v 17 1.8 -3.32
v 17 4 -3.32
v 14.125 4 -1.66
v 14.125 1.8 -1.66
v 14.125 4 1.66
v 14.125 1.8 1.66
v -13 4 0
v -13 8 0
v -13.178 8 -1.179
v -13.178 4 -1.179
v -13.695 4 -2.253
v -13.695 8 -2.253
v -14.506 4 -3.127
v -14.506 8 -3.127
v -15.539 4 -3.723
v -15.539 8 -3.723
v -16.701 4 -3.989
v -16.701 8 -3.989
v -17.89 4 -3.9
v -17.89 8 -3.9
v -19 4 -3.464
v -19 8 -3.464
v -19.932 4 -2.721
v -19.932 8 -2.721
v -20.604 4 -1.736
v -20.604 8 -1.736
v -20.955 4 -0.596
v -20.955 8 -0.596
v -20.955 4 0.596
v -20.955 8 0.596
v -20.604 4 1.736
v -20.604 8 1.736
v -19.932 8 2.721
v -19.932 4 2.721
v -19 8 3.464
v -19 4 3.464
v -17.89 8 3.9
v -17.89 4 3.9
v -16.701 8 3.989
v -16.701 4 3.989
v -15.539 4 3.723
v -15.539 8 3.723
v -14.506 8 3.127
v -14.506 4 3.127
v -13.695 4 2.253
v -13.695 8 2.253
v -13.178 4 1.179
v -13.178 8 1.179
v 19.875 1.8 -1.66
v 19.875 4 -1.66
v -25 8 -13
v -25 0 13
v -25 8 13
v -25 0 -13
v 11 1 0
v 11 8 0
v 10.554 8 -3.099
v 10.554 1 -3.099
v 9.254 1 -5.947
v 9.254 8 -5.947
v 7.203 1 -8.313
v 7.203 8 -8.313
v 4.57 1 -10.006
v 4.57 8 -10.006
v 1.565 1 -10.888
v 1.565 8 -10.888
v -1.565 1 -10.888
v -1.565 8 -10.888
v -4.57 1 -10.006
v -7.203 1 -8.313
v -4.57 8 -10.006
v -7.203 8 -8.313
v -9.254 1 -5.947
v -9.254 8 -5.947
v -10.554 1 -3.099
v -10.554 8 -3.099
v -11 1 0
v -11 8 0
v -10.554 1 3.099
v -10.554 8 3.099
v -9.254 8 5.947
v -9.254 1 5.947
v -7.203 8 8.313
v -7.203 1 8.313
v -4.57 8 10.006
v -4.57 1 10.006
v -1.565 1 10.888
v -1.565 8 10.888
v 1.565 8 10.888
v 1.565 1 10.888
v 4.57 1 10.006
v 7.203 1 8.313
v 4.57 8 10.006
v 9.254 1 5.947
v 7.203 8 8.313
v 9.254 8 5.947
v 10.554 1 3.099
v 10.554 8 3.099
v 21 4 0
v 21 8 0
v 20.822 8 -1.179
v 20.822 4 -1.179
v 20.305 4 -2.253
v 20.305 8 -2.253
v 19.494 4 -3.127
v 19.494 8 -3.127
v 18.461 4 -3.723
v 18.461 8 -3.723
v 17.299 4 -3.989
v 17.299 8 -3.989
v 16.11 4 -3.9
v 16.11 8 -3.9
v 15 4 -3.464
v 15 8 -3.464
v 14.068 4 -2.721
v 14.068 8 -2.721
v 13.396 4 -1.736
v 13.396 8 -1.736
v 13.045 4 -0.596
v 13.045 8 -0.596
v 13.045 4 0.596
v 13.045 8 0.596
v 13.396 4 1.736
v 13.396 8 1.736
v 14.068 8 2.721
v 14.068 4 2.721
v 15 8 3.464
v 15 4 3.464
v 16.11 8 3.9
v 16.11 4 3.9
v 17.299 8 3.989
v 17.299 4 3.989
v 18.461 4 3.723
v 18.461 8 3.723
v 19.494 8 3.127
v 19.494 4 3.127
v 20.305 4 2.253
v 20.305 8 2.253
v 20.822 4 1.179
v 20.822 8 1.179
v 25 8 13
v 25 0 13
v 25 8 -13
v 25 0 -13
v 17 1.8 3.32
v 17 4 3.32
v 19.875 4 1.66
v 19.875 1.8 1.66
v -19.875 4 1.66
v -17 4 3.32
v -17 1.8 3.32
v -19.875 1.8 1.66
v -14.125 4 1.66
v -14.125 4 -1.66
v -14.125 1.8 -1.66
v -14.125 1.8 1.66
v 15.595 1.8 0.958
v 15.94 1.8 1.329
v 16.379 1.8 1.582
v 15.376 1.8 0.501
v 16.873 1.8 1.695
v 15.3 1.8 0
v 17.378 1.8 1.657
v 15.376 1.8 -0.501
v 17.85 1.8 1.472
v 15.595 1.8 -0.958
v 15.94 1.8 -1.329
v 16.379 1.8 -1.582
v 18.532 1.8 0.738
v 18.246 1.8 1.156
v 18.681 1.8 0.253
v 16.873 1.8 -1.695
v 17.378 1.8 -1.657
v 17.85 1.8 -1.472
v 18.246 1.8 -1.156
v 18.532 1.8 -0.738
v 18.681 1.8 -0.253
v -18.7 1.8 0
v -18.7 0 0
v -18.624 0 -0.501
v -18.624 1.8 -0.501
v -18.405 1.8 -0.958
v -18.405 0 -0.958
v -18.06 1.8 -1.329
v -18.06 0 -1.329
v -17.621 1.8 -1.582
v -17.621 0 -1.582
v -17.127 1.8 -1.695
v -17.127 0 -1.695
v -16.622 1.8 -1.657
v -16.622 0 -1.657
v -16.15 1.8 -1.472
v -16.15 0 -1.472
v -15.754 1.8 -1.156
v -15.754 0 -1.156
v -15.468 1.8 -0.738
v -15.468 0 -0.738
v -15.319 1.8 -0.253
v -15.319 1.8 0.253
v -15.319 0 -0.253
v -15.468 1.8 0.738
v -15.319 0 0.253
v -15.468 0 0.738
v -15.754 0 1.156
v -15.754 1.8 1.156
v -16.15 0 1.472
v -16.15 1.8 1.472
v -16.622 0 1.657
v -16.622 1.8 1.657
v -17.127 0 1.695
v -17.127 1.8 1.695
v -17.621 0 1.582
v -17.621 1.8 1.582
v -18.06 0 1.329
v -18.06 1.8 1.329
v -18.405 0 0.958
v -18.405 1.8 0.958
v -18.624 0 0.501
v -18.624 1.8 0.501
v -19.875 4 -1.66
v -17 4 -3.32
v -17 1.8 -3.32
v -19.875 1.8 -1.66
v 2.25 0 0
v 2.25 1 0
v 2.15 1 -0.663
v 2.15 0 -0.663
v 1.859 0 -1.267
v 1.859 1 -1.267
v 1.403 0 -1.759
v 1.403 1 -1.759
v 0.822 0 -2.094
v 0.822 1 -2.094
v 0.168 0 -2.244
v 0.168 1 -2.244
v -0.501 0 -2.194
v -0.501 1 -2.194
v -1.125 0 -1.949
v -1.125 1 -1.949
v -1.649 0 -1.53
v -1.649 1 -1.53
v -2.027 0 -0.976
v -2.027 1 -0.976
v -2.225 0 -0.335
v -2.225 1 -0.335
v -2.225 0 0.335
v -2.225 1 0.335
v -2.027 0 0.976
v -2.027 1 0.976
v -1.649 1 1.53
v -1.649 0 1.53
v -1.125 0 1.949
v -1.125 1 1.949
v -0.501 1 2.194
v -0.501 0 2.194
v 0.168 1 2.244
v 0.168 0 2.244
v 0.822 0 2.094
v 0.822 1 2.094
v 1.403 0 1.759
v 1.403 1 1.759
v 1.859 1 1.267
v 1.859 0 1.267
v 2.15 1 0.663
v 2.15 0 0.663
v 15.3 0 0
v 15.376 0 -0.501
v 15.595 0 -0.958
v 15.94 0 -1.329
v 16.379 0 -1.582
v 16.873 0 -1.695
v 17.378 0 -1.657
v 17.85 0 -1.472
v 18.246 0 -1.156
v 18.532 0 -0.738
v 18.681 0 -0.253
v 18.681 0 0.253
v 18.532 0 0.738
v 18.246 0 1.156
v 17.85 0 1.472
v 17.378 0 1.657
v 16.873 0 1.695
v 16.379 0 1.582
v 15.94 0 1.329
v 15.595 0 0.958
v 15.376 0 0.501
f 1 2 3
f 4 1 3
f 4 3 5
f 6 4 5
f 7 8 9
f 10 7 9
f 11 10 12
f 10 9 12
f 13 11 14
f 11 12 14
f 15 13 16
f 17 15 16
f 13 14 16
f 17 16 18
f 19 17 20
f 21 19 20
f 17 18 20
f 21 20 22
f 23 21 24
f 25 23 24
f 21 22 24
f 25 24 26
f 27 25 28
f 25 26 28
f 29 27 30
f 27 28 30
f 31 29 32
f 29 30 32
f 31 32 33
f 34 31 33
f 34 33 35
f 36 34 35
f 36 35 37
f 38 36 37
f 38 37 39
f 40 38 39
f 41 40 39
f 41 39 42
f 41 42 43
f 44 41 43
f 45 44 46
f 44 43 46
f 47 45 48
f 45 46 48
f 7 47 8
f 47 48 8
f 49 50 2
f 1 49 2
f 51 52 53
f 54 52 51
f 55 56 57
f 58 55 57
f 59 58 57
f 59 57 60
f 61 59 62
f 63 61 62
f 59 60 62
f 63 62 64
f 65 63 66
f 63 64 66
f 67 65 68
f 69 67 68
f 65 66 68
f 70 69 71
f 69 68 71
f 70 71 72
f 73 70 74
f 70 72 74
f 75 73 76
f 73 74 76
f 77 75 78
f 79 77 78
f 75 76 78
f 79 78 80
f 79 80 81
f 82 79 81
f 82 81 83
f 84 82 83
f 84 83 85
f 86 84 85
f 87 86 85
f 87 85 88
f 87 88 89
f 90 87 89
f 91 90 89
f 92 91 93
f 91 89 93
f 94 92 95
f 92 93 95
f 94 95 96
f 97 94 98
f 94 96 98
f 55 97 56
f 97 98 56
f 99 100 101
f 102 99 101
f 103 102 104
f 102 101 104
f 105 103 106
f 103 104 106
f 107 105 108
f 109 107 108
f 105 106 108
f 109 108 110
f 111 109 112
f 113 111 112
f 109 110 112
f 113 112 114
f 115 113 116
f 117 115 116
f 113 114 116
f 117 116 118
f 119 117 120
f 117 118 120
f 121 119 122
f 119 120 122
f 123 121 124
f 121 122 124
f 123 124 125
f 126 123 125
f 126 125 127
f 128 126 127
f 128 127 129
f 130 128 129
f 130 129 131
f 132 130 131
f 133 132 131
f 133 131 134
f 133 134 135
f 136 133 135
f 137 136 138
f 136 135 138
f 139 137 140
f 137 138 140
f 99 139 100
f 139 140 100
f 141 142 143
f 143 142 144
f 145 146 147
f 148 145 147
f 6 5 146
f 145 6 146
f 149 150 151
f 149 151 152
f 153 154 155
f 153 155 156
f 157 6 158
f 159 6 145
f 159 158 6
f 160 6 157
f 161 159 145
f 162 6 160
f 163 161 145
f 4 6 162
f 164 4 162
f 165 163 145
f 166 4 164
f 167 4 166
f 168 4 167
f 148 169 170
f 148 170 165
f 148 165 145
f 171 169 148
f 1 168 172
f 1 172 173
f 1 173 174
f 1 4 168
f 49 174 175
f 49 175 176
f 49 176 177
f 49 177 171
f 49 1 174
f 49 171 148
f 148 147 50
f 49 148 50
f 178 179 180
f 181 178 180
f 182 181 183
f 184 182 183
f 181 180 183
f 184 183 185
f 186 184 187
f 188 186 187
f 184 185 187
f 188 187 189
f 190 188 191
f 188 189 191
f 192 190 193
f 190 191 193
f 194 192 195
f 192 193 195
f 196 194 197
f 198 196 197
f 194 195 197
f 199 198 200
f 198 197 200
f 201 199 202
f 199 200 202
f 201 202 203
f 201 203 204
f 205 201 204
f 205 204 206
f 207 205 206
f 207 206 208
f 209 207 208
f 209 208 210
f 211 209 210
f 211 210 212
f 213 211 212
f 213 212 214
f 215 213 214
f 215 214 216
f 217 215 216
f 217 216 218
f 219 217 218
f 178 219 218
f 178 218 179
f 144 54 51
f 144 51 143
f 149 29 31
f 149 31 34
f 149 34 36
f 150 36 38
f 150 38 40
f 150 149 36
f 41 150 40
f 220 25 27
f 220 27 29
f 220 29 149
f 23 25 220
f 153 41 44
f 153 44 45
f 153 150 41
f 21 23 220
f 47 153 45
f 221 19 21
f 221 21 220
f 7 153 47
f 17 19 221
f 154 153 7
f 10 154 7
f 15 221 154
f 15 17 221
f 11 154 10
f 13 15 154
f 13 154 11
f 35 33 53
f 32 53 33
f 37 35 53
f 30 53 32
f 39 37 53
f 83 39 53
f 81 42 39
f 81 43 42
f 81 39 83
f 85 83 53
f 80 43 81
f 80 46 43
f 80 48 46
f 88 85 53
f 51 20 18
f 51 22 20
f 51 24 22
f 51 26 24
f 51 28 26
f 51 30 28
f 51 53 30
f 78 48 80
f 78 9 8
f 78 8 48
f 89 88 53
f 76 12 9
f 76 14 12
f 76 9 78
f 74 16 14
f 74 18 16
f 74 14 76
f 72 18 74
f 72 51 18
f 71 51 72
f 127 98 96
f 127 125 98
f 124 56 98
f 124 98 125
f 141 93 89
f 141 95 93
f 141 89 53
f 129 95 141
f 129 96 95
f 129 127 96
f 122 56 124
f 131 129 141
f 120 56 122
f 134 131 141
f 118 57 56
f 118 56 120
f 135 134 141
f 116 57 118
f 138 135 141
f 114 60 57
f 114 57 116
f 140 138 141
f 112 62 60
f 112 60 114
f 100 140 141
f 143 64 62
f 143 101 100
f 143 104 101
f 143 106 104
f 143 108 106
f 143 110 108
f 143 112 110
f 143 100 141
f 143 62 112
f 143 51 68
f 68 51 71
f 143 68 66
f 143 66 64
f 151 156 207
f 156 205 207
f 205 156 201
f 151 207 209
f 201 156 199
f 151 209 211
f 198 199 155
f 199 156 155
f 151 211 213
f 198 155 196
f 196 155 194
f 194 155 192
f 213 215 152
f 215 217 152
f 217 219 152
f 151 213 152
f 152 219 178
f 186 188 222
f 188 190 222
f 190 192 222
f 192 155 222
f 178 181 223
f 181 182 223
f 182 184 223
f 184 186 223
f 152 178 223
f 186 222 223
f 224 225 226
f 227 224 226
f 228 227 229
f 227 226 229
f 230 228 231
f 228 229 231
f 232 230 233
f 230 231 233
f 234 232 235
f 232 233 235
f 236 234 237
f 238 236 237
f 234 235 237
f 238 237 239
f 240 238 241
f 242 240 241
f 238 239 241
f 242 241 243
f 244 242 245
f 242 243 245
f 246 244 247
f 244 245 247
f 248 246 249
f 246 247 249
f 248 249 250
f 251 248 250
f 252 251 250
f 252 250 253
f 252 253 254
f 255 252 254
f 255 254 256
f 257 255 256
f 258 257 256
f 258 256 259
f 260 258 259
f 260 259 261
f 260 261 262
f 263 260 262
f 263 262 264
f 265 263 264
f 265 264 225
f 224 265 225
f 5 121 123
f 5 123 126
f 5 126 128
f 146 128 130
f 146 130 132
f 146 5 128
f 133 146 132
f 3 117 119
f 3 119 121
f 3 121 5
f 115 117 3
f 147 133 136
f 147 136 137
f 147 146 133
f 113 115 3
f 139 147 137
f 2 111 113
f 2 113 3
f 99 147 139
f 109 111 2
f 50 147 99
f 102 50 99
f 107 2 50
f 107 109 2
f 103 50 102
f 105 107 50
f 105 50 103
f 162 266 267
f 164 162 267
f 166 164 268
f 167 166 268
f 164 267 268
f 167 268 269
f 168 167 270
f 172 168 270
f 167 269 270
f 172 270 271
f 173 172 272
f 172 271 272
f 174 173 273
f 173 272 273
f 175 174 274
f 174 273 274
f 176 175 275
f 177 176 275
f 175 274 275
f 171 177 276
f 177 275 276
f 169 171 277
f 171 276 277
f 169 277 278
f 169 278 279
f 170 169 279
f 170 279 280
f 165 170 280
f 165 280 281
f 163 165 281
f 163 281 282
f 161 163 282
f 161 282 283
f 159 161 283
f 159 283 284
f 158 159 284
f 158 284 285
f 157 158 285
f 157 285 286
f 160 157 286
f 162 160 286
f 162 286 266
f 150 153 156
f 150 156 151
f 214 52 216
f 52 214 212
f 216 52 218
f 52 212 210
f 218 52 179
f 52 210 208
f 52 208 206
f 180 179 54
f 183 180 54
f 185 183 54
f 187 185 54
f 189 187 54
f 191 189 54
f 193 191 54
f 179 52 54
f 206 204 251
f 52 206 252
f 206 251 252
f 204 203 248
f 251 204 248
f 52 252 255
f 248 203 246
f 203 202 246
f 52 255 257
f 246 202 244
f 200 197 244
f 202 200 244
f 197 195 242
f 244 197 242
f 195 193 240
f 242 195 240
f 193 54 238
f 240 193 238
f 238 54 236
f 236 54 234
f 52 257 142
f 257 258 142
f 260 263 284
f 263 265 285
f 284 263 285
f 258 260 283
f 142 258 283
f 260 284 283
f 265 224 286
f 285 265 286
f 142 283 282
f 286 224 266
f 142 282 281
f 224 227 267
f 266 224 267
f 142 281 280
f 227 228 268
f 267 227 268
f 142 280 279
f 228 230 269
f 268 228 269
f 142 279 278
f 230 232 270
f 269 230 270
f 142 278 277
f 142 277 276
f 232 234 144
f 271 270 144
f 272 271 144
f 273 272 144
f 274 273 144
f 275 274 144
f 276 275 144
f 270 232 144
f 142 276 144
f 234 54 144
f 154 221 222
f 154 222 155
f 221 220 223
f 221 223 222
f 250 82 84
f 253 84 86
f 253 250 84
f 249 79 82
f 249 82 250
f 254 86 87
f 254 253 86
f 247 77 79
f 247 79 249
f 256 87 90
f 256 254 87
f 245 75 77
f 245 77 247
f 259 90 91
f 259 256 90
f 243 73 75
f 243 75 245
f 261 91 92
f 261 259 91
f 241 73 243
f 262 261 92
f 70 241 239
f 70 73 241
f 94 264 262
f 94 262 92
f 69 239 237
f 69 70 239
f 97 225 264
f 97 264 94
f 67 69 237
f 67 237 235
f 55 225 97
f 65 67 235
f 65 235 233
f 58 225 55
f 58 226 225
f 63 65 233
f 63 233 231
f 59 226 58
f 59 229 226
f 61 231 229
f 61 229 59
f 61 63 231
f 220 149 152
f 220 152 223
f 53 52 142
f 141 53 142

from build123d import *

# Parameters (mm, degrees)
SKETCH1_W                = 50
SKETCH1_H                = 26
BOSS_EXTRUDE1_DEPTH      = 8
SKETCH2_R                = 11
CUT_EXTRUDE1_DEPTH       = 7
SKETCH5_R                = 2.25
CUT_EXTRUDE2_DEPTH       = 2
SKETCH6_R                = 4
CUT_EXTRUDE3_DEPTH       = 4
CUT_EXTRUDE4_DEPTH       = 2.2
M3_CLEARANCE_HOLE1_D     = 3.4
M3_CLEARANCE_HOLE1_DEPTH = 1.8


with BuildPart() as part:
    # Sketch1 → Boss-Extrude1 (new body)
    with BuildSketch(Plane(origin=(0, 0, 0), x_dir=(1, 0, 0), z_dir=(0, 1, 0))):
        Rectangle(SKETCH1_W, SKETCH1_H)
    extrude(amount=BOSS_EXTRUDE1_DEPTH)

    # Sketch2 → Cut-Extrude1 (cut)
    with BuildSketch(Plane(origin=(0, 8, 0), x_dir=(1, 0, 0), z_dir=(0, 1, 0))):
        Circle(SKETCH2_R)
    extrude(amount=-CUT_EXTRUDE1_DEPTH, mode=Mode.SUBTRACT)

    # Sketch5 → Cut-Extrude2 (cut, through all)
    with BuildSketch(Plane(origin=(0, 1, 0), x_dir=(1, 0, 0), z_dir=(0, 1, 0))):
        Circle(SKETCH5_R)
    extrude(amount=-CUT_EXTRUDE2_DEPTH, mode=Mode.SUBTRACT)

    # Sketch6 → Cut-Extrude3 (cut)
    with BuildSketch(Plane(origin=(0, 8, 0), x_dir=(1, 0, 0), z_dir=(0, 1, 0))):
        with Locations((17, 0)):
            Circle(SKETCH6_R)
        with Locations((-17, 0)):
            Circle(SKETCH6_R)
    extrude(amount=-CUT_EXTRUDE3_DEPTH, mode=Mode.SUBTRACT)

    # Sketch7 → Cut-Extrude4 (cut)
    with BuildSketch(Plane(origin=(0, 4, 0), x_dir=(1, 0, 0), z_dir=(0, 1, 0))):
        Polygon((19.875, -1.659882024), (19.875, 1.659882024), (17, 3.319764048), (14.125, 1.659882024), (14.125, -1.659882024), (17, -3.319764048), align=None)
        Polygon((-17, -3.319764048), (-19.875, -1.659882024), (-19.875, 1.659882024), (-17, 3.319764048), (-14.125, 1.659882024), (-14.125, -1.659882024), align=None)
    extrude(amount=-CUT_EXTRUDE4_DEPTH, mode=Mode.SUBTRACT)

    # M3 Clearance Hole1
    with Locations(Plane(origin=(0, 1.8, 0), x_dir=(1, 0, 0), z_dir=(0, 1, 0))):
        with Locations((17, 0), (-17, 0)):
            Hole(M3_CLEARANCE_HOLE1_D / 2, depth=M3_CLEARANCE_HOLE1_DEPTH)


solid = part.part
